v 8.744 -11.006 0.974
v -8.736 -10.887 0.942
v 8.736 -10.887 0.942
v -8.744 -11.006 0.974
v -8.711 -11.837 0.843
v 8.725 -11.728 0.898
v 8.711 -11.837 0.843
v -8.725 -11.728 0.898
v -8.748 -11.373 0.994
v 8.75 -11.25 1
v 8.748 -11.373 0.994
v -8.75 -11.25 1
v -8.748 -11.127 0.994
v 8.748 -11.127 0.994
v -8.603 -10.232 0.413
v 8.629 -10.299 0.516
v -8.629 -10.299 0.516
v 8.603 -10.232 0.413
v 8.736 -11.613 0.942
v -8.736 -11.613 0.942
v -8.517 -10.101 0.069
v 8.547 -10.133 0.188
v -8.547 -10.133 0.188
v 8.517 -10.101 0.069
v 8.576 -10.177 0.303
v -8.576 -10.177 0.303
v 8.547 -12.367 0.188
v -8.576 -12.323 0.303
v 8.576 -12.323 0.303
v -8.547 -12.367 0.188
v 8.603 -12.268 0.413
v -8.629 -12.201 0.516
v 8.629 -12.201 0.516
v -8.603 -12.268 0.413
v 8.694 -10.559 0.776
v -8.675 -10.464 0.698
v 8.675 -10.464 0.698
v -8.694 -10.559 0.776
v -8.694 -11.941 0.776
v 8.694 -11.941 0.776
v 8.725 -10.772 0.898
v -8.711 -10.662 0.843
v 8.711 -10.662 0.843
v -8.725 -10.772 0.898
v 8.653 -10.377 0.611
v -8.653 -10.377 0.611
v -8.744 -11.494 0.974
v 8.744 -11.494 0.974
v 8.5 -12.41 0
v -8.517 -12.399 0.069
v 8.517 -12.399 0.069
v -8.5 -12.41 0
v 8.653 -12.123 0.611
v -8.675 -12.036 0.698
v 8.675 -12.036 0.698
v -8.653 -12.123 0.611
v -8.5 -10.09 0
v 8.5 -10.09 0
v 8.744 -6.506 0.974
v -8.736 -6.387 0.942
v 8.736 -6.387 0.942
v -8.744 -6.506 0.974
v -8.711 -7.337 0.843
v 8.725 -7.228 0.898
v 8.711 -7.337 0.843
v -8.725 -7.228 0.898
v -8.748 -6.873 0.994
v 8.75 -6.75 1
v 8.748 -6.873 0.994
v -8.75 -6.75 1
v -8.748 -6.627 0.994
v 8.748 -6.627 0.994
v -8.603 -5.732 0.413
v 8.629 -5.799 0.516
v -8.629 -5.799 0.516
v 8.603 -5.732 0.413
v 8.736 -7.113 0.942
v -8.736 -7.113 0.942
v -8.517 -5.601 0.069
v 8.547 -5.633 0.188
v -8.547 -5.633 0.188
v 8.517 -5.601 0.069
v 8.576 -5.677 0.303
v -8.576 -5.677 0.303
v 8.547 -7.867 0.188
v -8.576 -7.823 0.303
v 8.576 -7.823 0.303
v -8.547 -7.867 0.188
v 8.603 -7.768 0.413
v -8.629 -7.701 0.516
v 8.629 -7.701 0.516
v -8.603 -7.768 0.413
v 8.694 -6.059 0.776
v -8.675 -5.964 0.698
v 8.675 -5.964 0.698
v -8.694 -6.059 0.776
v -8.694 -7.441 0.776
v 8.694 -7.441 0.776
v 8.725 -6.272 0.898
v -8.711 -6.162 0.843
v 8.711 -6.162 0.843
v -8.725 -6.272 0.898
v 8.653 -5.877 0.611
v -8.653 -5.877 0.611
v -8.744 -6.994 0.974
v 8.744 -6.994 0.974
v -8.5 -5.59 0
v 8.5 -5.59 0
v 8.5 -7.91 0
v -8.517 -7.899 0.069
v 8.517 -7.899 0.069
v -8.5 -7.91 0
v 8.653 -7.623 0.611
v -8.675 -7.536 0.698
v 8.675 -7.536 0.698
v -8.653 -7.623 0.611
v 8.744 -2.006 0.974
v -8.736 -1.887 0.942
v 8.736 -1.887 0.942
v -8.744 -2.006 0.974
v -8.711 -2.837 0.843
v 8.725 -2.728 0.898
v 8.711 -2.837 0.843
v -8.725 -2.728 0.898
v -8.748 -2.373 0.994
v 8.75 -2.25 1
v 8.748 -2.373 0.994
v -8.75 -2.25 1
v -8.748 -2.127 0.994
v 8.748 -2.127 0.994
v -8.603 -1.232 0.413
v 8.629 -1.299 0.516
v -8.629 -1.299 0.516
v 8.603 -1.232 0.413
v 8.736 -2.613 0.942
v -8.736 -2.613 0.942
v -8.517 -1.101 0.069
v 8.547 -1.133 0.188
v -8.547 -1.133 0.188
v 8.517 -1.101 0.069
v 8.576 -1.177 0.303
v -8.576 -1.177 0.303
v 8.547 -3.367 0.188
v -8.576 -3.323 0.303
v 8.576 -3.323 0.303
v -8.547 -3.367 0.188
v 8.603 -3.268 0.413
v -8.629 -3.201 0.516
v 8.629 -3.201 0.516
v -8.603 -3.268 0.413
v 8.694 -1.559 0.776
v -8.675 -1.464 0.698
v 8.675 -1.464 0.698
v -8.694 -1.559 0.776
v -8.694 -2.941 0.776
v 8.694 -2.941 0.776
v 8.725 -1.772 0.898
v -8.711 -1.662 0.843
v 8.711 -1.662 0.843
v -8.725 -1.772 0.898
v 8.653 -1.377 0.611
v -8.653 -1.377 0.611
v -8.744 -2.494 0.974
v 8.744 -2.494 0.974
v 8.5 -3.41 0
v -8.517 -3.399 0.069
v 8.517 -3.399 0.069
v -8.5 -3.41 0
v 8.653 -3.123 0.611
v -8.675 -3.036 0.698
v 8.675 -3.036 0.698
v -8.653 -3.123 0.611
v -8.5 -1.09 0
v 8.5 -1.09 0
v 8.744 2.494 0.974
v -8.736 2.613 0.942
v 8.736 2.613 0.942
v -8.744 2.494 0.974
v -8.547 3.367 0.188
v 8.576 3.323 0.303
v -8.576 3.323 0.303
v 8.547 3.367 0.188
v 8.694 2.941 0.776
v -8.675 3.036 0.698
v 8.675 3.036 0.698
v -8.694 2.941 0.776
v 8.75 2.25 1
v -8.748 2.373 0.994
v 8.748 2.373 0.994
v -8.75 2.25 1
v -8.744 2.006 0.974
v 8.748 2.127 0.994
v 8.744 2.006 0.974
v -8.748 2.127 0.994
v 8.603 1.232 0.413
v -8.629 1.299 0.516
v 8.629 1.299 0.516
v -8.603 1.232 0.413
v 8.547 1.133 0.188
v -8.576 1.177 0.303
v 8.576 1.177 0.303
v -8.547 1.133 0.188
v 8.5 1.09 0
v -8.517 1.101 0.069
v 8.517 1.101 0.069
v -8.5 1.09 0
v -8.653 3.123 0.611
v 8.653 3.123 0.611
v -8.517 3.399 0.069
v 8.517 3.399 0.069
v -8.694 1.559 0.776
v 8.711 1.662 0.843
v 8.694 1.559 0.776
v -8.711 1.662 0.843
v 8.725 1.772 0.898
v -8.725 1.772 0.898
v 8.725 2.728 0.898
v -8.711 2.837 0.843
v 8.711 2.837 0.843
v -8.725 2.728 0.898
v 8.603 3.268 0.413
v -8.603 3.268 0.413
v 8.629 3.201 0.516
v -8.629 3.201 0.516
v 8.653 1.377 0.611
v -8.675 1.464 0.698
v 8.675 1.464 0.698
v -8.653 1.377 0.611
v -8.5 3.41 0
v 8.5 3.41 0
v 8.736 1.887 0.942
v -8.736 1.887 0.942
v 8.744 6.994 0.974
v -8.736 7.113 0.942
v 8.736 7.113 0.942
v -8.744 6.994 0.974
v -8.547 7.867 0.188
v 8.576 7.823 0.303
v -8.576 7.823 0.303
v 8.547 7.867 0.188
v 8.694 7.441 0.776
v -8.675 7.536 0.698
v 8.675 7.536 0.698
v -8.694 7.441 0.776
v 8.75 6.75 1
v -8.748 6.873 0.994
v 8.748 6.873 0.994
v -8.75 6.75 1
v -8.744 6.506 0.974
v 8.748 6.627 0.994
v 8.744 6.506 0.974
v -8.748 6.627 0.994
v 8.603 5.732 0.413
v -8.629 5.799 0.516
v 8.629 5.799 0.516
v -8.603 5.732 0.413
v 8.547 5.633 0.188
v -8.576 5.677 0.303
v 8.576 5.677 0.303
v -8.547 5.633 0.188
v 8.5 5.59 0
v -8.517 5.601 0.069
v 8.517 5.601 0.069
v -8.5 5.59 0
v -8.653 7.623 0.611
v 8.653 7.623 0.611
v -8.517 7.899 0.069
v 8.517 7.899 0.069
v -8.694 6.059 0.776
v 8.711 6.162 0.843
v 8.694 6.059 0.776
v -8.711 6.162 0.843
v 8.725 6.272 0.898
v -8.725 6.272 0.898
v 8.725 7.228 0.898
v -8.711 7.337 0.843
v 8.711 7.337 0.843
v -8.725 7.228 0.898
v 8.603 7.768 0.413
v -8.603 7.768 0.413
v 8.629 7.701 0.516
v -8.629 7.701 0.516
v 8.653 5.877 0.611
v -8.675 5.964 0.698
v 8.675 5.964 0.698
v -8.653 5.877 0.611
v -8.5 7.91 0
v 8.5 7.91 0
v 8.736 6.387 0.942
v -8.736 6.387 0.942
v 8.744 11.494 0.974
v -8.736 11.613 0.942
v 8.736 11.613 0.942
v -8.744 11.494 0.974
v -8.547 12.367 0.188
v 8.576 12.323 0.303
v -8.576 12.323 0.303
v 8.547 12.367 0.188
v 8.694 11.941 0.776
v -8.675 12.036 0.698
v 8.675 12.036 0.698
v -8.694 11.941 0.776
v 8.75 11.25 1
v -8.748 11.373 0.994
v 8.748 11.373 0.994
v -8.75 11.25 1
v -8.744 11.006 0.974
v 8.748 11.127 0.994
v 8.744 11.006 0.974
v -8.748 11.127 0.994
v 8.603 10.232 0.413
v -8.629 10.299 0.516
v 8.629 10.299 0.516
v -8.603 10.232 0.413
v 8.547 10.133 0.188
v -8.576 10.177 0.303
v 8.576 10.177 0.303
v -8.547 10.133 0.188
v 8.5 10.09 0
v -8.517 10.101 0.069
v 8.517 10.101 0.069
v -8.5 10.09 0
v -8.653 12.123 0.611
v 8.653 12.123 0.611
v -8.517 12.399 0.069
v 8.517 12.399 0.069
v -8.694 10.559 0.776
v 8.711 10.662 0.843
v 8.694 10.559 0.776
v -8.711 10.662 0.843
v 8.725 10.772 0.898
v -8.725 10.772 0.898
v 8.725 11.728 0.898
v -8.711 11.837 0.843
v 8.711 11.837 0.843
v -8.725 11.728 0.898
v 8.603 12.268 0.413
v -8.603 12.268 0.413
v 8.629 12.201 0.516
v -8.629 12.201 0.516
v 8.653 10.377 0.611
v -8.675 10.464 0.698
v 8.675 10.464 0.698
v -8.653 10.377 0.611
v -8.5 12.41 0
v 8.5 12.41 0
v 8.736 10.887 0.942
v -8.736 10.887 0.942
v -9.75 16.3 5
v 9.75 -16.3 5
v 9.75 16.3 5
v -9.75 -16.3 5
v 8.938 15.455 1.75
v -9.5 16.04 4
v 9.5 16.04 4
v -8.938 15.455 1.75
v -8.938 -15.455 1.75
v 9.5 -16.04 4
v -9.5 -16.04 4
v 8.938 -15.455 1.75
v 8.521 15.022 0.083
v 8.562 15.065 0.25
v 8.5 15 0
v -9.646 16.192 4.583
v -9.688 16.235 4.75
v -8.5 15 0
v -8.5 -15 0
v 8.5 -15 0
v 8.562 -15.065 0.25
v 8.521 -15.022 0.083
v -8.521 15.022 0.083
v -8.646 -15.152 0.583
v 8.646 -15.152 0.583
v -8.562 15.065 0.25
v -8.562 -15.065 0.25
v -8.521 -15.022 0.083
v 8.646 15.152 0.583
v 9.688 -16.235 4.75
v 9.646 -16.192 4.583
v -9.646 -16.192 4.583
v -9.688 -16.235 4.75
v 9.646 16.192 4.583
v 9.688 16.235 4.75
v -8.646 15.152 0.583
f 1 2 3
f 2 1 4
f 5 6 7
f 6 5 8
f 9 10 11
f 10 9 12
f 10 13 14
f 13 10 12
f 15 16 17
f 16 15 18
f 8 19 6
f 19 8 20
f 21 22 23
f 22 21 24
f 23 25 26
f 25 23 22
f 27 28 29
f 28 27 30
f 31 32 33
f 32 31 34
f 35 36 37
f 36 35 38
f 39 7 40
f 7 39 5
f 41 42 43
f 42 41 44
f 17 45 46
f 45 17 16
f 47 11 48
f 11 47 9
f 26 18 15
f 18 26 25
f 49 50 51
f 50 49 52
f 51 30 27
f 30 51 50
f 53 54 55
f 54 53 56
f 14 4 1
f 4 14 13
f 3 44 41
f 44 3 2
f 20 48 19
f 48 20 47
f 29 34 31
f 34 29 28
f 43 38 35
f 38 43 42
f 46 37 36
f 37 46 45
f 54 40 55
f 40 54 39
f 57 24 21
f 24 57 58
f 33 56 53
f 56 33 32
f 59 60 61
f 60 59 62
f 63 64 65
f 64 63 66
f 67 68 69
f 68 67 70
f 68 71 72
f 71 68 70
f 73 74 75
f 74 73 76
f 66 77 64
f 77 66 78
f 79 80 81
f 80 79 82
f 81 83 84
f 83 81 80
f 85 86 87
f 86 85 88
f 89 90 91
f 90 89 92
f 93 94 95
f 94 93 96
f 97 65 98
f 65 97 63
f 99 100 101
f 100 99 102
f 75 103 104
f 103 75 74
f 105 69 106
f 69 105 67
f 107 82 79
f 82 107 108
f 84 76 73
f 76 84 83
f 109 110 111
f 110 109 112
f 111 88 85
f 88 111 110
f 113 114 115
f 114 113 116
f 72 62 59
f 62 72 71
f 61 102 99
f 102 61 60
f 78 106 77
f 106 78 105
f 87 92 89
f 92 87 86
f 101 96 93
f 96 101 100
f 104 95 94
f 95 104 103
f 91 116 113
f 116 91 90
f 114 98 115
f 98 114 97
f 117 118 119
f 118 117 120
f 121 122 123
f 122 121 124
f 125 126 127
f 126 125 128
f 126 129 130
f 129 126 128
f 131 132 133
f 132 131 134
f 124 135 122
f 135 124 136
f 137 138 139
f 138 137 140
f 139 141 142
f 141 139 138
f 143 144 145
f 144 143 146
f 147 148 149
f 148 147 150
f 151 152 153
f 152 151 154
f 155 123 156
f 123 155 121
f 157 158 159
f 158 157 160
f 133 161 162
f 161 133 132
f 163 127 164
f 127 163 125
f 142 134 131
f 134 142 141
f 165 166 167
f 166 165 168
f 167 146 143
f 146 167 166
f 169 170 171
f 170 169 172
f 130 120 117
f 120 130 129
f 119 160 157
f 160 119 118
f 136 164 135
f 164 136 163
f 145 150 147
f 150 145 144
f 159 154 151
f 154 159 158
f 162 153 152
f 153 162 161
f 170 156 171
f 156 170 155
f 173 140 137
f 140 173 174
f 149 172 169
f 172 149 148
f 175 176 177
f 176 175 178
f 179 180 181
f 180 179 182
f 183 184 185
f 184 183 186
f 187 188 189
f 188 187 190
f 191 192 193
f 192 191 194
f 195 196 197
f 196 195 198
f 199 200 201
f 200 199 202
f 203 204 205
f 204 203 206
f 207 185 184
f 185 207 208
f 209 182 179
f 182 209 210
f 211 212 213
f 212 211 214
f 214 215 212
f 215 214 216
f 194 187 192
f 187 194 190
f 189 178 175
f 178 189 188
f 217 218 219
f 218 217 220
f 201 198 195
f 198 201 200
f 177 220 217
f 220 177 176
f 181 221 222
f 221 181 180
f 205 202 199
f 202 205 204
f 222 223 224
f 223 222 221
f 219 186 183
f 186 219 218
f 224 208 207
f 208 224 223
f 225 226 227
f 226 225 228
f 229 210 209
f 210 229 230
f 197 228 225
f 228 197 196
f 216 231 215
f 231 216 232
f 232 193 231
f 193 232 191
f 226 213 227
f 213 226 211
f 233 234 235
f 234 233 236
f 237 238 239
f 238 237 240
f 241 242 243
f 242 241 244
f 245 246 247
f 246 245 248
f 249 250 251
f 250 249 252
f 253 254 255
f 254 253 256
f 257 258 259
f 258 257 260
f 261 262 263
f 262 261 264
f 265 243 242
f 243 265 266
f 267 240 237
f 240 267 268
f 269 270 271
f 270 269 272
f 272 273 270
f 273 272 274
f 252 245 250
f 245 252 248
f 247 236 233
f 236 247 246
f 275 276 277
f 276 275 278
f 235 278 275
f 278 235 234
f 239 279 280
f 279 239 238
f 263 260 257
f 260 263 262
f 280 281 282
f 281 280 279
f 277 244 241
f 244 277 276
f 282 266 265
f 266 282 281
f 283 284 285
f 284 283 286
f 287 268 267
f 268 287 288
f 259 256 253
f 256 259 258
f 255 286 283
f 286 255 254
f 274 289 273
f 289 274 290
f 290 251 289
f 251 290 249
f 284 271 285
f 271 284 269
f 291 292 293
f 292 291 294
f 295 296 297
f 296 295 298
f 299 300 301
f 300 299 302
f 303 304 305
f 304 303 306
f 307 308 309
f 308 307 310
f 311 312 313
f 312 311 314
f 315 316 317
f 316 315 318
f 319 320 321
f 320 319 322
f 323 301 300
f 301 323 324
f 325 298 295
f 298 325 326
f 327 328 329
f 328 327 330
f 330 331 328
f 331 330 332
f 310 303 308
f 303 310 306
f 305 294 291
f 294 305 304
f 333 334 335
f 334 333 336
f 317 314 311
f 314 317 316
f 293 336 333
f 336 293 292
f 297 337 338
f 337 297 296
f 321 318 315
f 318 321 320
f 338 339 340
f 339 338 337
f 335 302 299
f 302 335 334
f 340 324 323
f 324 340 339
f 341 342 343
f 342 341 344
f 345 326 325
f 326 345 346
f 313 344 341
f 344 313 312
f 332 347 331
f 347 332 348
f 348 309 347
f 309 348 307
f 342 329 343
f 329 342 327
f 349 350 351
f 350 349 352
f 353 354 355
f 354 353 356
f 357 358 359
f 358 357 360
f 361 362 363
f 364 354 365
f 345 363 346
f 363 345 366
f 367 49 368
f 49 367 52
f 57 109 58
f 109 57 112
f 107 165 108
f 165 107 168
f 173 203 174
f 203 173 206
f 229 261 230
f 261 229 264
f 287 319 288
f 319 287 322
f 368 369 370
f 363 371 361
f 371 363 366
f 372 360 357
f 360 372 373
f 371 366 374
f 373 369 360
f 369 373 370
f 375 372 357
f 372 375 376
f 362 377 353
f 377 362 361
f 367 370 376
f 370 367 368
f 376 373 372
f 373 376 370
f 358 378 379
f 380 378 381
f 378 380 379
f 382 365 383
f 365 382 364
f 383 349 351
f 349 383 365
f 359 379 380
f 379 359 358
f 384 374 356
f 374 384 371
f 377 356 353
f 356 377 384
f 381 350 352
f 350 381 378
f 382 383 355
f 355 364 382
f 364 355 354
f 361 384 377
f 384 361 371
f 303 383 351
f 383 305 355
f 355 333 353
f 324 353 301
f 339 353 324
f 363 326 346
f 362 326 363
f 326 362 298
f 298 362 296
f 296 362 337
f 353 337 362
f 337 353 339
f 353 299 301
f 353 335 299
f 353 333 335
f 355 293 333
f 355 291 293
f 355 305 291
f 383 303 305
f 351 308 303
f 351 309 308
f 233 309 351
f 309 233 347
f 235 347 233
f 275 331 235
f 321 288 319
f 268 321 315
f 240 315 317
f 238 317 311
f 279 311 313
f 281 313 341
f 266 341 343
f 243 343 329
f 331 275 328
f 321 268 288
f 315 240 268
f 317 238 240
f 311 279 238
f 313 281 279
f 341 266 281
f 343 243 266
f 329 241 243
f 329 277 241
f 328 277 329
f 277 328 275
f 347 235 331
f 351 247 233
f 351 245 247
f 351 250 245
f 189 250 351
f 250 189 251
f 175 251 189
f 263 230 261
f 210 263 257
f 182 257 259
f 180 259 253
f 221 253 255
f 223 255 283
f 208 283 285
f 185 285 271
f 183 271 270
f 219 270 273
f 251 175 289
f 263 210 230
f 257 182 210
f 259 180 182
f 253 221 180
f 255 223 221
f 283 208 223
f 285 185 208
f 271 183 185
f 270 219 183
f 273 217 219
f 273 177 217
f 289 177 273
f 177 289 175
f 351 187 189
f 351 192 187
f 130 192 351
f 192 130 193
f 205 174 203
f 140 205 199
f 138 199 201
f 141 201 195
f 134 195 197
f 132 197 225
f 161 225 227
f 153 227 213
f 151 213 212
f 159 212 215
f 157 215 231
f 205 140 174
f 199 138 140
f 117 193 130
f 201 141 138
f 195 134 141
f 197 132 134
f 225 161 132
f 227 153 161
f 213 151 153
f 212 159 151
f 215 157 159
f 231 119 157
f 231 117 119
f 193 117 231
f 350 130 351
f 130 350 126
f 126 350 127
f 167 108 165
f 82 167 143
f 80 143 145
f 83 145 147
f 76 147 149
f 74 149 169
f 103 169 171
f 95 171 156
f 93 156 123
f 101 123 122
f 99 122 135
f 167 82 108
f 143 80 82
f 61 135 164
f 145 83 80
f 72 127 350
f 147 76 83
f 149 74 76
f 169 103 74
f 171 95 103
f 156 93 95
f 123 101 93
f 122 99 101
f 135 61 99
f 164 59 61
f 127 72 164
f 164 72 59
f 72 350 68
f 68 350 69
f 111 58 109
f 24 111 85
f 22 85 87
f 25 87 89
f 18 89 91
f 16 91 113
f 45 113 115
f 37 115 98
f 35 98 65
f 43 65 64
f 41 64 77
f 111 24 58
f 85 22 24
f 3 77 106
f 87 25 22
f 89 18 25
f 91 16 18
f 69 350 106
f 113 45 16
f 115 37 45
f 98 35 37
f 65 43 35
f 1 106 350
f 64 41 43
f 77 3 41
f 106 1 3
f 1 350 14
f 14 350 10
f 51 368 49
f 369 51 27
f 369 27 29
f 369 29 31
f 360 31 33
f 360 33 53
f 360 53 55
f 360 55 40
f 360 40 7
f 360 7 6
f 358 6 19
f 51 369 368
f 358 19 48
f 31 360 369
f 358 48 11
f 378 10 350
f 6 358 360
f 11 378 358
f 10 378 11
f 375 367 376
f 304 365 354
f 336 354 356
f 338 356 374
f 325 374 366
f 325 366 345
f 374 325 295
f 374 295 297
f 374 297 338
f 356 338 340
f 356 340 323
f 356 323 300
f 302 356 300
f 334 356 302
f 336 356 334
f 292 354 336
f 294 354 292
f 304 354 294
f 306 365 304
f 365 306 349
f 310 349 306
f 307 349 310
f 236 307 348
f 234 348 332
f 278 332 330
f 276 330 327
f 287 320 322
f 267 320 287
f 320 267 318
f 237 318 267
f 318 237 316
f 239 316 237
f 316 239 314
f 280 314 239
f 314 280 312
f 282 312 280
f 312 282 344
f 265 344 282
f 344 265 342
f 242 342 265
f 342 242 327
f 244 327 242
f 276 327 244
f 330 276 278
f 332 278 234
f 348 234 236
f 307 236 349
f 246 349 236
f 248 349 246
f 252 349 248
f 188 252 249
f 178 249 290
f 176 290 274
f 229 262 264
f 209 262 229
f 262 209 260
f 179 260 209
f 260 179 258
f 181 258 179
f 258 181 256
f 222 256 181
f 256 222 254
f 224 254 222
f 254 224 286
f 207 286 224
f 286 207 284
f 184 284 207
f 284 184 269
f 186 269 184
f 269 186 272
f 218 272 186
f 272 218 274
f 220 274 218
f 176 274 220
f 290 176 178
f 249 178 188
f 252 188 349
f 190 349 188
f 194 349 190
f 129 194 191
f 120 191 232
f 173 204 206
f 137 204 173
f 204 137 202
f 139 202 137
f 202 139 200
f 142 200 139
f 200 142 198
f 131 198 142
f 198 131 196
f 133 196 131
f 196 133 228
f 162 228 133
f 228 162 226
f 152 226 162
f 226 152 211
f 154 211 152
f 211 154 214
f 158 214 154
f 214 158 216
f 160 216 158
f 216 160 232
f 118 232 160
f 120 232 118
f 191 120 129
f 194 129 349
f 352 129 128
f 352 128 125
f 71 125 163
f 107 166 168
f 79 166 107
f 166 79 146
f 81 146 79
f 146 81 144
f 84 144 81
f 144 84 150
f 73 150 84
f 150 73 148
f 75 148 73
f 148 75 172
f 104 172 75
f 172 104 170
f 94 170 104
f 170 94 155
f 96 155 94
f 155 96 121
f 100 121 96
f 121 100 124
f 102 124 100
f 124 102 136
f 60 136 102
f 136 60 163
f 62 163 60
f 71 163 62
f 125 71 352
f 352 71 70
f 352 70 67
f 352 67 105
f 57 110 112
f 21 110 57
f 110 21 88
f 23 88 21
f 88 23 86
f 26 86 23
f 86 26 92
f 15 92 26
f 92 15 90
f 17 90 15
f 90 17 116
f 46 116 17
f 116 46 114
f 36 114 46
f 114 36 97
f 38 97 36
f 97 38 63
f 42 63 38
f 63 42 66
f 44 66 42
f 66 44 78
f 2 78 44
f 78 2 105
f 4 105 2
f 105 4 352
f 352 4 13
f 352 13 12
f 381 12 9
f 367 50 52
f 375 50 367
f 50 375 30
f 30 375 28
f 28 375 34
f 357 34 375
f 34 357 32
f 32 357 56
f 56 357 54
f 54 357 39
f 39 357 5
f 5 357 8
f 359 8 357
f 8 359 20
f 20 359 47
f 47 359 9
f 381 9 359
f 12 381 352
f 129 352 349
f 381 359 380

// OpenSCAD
// FieldWorks 8000 Series rubber foot
// Copyright François Revol, 2026


bbox = [19.5,32.6, 5];
$fn=60;

module FW8000_foot() {
    difference() {
        linear_extrude(bbox.z, scale=[17/bbox.x,30/bbox.y]) {
            square([bbox.x, bbox.y], center=true);
        }
        for (dy=[-5:2:5]) {
            d=2.35;
            translate([0,dy*22.5/5/2,bbox.z+d/2-1])
                rotate([0,90,0])
                cylinder(d=d, h=30, center=true);
        }
    }
}

if ($preview) {
    FW8000_foot();
} else {
    translate([0,0,bbox.z]) rotate([0,180,0]) FW8000_foot();
}
